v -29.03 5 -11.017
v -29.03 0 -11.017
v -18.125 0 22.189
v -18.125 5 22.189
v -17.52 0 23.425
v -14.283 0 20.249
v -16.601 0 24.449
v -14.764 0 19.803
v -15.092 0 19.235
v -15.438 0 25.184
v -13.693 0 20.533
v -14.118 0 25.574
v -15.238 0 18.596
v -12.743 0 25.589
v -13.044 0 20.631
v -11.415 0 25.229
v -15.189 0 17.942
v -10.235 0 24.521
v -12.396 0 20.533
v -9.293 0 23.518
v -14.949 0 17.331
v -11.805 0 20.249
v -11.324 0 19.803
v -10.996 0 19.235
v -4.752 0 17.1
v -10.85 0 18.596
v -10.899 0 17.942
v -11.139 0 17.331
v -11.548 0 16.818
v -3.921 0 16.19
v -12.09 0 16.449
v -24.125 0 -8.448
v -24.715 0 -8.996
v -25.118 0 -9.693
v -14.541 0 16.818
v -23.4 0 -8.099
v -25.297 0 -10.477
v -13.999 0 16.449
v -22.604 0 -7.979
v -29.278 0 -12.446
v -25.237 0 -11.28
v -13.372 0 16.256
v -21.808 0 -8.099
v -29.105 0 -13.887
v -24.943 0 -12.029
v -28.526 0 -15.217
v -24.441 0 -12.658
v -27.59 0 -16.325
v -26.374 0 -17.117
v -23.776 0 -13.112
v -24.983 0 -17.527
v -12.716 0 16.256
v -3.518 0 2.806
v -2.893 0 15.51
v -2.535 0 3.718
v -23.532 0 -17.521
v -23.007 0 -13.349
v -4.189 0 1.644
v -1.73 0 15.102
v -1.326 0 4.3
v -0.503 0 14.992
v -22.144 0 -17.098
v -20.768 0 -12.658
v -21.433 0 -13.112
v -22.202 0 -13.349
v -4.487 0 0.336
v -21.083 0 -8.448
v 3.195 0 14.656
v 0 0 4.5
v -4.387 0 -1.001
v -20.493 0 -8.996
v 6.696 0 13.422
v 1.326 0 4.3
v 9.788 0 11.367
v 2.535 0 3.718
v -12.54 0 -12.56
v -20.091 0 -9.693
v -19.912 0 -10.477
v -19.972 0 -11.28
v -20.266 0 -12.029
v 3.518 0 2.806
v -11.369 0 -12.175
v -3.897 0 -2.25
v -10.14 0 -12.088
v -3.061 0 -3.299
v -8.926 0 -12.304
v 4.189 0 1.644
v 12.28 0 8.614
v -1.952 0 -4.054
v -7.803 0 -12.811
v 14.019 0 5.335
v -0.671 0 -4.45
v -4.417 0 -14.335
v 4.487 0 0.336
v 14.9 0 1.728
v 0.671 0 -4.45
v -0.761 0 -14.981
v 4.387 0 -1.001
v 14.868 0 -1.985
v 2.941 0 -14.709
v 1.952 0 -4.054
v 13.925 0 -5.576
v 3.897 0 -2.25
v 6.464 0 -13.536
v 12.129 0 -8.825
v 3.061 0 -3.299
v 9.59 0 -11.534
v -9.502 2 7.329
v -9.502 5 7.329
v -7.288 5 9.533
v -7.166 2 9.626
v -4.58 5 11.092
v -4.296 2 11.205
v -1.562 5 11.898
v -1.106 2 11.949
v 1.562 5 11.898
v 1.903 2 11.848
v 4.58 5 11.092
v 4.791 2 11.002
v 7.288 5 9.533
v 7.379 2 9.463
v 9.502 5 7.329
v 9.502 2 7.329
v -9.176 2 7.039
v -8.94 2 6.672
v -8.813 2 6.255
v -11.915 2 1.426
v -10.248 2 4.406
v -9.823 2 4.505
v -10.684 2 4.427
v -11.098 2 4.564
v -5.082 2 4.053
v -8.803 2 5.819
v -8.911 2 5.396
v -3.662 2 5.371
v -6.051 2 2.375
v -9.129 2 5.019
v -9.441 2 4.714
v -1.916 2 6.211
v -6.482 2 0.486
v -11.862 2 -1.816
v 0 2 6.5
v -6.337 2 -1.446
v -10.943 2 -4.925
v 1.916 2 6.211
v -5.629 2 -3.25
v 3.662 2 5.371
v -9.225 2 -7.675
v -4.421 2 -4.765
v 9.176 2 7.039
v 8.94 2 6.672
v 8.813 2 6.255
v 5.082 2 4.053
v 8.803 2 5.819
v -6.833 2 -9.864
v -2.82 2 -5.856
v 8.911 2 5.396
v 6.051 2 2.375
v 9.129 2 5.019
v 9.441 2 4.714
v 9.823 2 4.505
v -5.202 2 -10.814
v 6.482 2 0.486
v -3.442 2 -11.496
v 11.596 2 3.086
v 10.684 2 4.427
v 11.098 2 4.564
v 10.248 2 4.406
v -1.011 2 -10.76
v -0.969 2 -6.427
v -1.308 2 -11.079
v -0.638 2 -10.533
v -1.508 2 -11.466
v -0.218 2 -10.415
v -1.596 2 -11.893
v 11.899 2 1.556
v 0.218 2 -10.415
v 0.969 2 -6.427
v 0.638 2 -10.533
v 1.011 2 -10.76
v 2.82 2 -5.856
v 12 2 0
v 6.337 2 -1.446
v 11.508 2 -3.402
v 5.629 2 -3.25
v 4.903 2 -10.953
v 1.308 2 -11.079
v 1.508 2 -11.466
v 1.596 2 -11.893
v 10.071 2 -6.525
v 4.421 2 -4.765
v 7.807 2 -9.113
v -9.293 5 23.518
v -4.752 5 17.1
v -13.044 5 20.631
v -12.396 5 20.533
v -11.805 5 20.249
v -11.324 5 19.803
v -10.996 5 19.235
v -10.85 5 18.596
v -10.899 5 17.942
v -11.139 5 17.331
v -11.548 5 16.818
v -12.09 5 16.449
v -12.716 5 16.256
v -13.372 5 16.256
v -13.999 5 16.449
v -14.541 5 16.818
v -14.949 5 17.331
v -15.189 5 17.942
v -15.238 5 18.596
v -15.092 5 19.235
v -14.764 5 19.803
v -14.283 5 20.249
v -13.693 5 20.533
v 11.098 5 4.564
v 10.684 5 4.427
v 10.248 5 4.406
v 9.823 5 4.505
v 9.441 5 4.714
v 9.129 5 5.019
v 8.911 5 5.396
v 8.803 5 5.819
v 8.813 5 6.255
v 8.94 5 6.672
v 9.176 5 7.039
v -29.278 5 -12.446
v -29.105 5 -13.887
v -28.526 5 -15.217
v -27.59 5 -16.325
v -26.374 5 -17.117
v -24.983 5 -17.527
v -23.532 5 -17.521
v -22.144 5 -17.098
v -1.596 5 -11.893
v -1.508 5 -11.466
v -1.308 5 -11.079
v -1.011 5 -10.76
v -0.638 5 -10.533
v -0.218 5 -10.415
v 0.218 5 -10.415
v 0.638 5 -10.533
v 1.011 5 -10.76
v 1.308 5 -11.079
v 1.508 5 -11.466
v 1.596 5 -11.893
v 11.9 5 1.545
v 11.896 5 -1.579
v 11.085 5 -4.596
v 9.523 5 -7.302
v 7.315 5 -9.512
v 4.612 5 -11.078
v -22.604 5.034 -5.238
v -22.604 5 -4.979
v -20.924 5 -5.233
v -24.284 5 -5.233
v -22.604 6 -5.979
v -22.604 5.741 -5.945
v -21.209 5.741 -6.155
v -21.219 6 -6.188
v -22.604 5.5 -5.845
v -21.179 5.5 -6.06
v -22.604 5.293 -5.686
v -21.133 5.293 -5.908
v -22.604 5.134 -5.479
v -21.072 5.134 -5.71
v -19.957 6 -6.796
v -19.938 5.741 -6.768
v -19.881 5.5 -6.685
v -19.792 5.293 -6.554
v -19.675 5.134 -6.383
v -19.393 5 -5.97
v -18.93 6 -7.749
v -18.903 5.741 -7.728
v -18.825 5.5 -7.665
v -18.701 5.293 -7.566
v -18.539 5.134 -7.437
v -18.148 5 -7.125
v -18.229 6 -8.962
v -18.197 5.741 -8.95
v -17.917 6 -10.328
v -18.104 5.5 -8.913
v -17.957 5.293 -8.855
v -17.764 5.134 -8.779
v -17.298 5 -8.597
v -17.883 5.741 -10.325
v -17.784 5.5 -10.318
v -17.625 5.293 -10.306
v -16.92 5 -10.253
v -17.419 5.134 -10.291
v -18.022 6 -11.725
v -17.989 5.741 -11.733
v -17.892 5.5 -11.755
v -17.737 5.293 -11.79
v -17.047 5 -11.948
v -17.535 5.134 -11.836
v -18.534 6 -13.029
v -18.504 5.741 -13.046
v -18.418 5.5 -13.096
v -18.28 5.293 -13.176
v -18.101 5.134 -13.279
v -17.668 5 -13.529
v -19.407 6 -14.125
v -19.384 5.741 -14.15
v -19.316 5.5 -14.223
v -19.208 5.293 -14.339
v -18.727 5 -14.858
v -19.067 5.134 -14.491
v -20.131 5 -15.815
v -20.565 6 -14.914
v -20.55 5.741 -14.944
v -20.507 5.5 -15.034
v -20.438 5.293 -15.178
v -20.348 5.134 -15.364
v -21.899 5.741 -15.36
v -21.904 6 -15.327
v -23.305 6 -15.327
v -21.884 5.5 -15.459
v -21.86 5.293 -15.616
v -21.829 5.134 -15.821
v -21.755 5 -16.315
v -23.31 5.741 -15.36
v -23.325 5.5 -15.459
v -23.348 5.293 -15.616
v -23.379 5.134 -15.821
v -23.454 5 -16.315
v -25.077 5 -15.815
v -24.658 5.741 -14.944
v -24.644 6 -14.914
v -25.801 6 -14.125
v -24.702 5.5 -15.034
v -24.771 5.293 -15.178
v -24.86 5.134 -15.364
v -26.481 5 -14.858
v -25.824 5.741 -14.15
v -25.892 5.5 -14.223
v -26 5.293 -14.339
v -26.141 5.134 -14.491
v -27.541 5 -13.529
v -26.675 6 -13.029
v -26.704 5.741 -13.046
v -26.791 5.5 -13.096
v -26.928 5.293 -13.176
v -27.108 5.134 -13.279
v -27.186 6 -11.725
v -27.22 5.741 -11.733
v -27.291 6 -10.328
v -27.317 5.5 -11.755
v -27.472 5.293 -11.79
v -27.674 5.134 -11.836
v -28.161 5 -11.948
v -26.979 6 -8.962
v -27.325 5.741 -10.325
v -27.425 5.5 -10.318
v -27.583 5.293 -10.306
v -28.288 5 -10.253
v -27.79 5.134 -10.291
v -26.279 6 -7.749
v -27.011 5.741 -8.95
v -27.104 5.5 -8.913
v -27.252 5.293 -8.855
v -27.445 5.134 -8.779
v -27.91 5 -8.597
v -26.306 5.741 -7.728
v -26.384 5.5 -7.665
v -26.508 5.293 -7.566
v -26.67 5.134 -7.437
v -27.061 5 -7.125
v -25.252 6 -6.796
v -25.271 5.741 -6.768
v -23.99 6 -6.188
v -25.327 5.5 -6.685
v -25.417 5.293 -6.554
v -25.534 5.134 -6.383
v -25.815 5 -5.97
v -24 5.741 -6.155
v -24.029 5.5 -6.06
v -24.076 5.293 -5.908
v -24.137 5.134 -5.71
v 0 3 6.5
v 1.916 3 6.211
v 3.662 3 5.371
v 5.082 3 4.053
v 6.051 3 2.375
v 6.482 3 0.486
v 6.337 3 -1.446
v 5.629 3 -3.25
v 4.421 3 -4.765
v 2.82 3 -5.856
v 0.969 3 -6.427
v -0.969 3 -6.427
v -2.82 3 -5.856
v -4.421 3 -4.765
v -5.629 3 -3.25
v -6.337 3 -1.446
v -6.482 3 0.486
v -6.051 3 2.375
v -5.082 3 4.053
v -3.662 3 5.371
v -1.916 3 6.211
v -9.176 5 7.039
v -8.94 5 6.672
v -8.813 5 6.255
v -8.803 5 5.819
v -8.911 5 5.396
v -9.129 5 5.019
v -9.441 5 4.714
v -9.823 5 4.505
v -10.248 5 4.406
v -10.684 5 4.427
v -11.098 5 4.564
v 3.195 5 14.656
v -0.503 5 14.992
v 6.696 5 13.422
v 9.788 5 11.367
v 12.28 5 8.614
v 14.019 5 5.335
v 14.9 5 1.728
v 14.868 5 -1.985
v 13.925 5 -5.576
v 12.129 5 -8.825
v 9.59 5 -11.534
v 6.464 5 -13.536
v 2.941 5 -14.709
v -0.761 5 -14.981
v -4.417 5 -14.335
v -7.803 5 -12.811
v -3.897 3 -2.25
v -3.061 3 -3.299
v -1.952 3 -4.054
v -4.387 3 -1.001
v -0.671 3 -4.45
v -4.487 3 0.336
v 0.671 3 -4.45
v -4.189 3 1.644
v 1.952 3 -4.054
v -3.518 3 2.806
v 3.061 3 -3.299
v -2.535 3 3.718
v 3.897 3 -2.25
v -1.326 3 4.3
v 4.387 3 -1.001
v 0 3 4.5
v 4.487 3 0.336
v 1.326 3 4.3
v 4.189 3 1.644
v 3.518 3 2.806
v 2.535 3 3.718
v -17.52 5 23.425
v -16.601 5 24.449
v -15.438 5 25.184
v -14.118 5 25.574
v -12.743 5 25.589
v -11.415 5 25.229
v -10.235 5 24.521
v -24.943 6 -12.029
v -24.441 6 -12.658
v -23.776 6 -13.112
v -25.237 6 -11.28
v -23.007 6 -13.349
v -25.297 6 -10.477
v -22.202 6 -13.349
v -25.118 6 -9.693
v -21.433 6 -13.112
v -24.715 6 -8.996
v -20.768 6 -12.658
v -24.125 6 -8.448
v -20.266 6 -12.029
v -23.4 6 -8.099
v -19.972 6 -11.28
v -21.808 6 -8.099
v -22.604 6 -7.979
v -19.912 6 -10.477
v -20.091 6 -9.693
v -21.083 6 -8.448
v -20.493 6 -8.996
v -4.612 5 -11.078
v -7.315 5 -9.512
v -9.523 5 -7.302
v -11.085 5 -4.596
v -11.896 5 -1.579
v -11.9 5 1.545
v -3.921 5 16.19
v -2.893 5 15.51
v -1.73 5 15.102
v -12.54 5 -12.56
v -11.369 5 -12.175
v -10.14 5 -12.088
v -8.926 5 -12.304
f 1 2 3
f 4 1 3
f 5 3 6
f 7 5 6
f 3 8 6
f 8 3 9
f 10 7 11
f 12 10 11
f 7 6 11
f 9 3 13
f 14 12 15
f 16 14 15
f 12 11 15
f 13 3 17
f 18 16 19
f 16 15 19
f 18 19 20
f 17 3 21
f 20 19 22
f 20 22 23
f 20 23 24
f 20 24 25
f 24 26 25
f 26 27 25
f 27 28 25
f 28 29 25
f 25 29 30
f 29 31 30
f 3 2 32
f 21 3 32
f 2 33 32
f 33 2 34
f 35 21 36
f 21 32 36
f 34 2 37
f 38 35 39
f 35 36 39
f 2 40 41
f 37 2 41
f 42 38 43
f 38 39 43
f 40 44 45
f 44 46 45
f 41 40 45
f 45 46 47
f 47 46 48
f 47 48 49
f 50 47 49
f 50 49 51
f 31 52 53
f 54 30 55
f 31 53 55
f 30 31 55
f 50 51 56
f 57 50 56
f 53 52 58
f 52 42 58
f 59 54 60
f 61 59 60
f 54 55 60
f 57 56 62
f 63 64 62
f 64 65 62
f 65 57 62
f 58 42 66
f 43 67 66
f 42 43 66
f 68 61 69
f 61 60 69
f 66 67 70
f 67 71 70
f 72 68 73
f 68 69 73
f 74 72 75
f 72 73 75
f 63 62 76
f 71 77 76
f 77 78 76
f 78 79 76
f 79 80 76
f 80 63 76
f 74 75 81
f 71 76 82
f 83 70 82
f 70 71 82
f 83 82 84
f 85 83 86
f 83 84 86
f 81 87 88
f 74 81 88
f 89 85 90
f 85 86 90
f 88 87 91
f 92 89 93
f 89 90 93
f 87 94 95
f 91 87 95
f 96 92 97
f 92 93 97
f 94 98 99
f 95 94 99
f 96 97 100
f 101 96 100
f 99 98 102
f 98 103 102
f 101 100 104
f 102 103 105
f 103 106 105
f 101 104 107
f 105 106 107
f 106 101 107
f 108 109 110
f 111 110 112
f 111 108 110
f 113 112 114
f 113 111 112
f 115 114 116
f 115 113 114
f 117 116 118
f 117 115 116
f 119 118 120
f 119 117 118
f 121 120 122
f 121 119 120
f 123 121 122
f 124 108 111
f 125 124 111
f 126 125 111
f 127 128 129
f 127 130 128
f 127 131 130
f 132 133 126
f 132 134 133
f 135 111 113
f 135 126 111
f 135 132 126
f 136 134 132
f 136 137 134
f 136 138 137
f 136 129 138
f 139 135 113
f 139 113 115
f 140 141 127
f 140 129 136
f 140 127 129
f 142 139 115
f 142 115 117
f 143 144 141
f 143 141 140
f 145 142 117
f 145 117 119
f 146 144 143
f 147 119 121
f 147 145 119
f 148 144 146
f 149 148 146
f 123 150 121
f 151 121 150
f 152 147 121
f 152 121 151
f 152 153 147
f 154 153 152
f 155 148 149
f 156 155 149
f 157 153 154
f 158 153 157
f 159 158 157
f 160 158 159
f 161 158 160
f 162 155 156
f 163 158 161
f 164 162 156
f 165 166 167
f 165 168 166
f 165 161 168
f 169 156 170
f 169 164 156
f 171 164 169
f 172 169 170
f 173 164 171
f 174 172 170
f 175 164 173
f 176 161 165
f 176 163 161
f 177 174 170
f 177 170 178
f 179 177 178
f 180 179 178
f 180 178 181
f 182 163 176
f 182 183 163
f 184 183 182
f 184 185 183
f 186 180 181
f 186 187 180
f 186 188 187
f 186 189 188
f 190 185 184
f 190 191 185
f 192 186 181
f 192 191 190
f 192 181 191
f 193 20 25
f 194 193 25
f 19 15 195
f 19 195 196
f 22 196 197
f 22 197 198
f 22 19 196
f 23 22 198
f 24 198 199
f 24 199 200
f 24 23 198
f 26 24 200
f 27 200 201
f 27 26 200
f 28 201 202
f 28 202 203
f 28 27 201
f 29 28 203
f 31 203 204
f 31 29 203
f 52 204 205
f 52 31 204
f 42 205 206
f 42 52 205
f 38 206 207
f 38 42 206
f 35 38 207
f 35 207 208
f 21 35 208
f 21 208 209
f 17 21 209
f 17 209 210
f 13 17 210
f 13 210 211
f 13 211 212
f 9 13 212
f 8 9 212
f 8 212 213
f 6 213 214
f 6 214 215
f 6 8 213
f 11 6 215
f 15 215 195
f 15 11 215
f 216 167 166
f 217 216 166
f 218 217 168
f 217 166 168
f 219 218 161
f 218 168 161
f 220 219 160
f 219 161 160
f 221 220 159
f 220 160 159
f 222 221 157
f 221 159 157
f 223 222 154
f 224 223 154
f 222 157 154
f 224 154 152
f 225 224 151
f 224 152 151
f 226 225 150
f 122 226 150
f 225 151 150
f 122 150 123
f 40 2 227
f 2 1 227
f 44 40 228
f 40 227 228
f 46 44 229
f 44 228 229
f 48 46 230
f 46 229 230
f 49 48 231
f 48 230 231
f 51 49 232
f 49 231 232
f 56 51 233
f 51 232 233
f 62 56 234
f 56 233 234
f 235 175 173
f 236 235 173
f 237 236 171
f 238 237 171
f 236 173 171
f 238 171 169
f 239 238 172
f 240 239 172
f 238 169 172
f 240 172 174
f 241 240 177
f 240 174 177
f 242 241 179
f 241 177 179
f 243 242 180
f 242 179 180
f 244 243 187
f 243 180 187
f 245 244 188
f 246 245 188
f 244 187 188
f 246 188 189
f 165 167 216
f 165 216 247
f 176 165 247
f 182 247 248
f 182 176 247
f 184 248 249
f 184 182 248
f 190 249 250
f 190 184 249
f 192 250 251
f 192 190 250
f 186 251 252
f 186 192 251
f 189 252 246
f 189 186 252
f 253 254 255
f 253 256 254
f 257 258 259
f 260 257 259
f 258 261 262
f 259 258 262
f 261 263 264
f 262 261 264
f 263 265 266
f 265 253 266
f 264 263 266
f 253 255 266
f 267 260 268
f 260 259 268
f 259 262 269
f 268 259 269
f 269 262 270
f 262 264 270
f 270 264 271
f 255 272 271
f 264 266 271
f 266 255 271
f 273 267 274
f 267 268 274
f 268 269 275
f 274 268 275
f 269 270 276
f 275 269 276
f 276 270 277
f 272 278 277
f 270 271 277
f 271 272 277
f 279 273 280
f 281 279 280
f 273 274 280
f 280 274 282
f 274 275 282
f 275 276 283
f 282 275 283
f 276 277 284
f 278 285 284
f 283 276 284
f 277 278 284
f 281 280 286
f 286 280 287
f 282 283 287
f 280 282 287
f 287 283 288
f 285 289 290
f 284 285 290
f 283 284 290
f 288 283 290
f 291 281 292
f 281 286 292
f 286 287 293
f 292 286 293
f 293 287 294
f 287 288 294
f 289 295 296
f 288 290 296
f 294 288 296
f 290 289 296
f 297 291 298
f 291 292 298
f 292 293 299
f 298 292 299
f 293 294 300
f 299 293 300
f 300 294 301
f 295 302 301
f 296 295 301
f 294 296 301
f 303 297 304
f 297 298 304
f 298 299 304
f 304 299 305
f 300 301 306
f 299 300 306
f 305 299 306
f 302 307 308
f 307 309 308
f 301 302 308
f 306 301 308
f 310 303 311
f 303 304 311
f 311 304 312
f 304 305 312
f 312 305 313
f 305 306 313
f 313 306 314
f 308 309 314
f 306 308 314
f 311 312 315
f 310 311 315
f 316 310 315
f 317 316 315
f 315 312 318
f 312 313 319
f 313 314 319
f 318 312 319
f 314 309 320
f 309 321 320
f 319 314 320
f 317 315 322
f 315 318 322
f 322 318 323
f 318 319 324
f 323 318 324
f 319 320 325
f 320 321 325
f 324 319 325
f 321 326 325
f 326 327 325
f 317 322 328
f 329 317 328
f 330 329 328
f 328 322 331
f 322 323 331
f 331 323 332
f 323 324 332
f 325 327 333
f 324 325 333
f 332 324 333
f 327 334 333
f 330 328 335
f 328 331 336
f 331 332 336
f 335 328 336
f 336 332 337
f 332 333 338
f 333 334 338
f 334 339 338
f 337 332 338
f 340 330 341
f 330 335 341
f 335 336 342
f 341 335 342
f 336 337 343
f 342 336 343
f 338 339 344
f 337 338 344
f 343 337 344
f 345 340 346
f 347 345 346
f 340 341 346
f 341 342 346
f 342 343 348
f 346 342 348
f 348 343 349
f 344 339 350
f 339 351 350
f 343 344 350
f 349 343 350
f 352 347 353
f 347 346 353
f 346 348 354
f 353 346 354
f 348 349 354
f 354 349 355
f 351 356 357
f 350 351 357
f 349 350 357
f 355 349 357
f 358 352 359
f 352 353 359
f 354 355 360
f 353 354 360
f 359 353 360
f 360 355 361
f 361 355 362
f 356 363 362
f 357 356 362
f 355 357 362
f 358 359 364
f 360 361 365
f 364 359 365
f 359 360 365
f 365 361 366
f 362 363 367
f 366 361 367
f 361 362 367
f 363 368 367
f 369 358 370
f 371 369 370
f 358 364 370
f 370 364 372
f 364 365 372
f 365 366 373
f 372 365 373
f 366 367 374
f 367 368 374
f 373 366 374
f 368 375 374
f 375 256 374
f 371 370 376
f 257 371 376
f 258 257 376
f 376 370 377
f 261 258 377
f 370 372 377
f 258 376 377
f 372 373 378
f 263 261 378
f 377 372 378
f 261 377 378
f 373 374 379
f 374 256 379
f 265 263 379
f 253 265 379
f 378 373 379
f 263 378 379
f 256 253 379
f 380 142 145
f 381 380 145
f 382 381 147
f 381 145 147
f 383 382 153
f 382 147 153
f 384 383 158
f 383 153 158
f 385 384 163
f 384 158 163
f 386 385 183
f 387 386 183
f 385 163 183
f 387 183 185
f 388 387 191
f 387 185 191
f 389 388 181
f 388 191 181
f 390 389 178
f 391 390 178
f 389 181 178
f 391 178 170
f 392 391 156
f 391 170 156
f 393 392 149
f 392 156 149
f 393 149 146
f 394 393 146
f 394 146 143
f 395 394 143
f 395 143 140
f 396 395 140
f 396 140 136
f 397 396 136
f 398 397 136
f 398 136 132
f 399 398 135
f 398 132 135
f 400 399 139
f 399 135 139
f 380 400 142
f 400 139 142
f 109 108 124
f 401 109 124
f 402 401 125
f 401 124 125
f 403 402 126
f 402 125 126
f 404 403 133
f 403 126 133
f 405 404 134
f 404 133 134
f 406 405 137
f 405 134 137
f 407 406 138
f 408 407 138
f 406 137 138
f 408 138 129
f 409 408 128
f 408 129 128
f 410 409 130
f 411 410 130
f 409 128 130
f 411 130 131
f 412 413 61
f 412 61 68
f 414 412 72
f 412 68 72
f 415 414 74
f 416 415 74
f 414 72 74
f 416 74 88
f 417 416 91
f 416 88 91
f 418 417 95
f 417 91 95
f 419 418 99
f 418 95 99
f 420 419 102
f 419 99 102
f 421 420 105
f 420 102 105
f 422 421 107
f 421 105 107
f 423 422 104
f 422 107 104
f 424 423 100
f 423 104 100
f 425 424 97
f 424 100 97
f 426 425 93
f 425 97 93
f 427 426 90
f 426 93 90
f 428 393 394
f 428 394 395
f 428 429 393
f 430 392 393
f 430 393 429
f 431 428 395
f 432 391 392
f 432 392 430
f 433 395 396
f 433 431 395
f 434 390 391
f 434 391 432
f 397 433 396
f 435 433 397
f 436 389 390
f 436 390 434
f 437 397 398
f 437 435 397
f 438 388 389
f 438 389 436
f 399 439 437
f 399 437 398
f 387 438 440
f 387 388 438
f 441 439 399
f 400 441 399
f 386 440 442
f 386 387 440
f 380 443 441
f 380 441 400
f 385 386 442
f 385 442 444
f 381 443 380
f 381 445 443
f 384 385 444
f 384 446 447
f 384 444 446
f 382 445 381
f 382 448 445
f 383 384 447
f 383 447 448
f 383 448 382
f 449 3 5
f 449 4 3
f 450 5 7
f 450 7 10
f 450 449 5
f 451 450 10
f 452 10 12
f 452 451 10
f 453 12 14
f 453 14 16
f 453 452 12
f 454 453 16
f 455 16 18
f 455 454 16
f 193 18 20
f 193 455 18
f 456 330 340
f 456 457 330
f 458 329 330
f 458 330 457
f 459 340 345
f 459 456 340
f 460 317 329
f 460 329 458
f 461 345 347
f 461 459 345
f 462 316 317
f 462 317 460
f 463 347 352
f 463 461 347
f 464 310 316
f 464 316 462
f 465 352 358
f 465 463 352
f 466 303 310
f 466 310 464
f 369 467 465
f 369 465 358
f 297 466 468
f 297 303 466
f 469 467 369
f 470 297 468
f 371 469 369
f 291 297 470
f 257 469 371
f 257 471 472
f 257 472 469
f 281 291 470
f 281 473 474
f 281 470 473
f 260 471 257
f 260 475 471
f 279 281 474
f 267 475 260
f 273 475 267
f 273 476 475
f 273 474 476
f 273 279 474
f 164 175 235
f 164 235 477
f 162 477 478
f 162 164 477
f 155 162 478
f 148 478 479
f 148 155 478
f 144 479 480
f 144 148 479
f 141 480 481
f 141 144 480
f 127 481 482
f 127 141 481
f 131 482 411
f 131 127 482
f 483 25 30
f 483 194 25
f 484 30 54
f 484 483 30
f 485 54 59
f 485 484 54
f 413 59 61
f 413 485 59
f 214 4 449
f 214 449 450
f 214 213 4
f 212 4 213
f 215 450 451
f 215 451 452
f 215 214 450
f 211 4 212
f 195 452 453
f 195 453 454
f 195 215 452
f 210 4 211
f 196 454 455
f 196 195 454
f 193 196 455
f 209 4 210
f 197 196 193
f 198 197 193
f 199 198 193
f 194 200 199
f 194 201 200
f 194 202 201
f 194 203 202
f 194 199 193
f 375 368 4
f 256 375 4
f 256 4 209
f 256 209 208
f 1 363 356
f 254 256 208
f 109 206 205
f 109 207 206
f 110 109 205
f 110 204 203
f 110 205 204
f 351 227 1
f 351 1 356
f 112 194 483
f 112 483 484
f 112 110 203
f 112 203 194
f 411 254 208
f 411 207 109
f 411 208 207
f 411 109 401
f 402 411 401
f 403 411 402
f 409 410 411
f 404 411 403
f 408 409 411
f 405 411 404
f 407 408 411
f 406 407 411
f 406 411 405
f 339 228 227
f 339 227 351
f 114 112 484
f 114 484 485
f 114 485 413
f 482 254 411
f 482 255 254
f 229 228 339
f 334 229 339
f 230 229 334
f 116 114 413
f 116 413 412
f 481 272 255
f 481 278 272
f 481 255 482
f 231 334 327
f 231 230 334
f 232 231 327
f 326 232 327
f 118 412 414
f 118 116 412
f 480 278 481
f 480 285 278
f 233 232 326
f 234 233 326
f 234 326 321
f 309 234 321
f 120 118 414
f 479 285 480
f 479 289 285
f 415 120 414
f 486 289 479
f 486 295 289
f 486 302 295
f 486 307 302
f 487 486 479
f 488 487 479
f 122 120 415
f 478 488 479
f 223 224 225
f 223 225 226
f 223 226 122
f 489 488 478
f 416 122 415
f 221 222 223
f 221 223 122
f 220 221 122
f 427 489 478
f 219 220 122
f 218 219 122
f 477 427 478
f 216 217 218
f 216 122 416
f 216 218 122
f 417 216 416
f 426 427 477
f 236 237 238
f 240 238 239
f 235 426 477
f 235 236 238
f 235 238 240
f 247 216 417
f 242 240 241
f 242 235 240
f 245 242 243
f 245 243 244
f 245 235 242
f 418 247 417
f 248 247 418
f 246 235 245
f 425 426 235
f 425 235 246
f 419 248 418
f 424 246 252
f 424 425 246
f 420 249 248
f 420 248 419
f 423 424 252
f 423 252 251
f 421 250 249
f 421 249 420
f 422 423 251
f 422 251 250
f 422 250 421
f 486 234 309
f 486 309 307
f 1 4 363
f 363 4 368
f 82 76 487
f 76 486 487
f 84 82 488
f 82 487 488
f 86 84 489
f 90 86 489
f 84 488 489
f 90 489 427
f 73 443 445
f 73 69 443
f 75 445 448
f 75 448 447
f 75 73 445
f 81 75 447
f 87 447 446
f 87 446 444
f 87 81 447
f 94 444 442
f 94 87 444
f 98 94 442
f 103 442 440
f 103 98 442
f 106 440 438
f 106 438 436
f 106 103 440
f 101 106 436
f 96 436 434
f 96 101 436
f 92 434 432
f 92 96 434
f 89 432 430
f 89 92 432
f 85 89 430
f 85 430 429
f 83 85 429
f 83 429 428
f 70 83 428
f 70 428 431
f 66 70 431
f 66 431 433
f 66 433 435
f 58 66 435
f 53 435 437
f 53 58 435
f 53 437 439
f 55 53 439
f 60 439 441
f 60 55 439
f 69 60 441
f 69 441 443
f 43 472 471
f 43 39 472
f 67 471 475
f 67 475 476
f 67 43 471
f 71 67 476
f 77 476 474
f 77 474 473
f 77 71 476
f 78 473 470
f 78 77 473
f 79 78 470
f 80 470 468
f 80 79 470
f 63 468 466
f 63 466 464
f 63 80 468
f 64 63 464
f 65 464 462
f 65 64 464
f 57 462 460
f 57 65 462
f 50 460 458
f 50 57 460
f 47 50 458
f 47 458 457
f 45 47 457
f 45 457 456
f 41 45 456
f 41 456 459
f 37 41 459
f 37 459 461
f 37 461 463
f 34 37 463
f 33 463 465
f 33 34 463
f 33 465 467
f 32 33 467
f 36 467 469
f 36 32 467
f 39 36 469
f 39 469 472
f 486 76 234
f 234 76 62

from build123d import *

# Parameters (mm, degrees)
SKETCH2_R           = 12
SKETCH2_R_2         = 2.2
SKETCH2_R_3         = 2.7
BOSS_EXTRUDE1_DEPTH = 5
SKETCH2_4_R         = 4.5
BOSS_EXTRUDE2_DEPTH = 2
FILLET1_R           = 5
FILLET2_R           = 5
SKETCH3_R           = 4.7
SKETCH3_R_2         = 2.7
BOSS_EXTRUDE3_DEPTH = 1
FILLET4_R           = 1
SKETCH4_R           = 6.5
SKETCH4_R_2         = 4.5
BOSS_EXTRUDE5_DEPTH = 1
BOSS_EXTRUDE6_DEPTH = 3


with BuildPart() as part:
    # Sketch2 → Boss-Extrude1 (new body)
    with BuildSketch(Plane(origin=(0, 0, 0), x_dir=(1, 0, 0), z_dir=(0, 1, 0))):
        with BuildLine():
            Line((-32.658907628, 22.065310299), (-15.027926619, -31.62041432))
            Line((-15.027926619, -31.62041432), (-3.044319626, -14.687822099))
            ThreePointArc((-3.044319626, -14.687822099), (14.508216797, 3.809415358), (-9.86730521, 11.297623108))
            Line((-9.86730521, 11.297623108), (-32.658907628, 22.065310299))
        make_face()
        with Locations(Location((0, 0, 0), (0, 0, 270))):
            Circle(SKETCH2_R, mode=Mode.SUBTRACT)
        with Locations(Location((-13.044155697, -18.431125905, 0), (0, 0, 270))):
            Circle(SKETCH2_R_2, mode=Mode.SUBTRACT)
        with Locations(Location((-22.604306415, 10.679200882, 0), (0, 0, 270))):
            Circle(SKETCH2_R_3, mode=Mode.SUBTRACT)
    extrude(amount=BOSS_EXTRUDE1_DEPTH)

    # Sketch2<4> → Boss-Extrude2 (add)
    # profile 1 of 2: a face of its own
    with BuildSketch(Plane(origin=(0, 0, 0), x_dir=(1, 0, 0), z_dir=(0, 1, 0))):
        with BuildLine():
            Line((9.028311423, 2.370559296), (-1.105938309, -11.948928841))
            ThreePointArc((-1.105938309, -11.948928841), (8.084823445, -8.867673306), (12, 0))
            ThreePointArc((12, 0), (5.567714695, 10.630171827), (-6.833425512, 9.864293983))
            Line((-6.833425512, 9.864293983), (9.028311423, 2.370559296))
        make_face()
    # profile 2 of 2: a face of its own
    with BuildSketch(Plane(origin=(0, 0, 0), x_dir=(1, 0, 0), z_dir=(0, 1, 0))):
        with BuildLine():
            ThreePointArc((-6.833425512, 9.864293983), (-11.606573438, -3.047532287), (-1.105938309, -11.948928841))
            Line((-1.105938309, -11.948928841), (9.028311423, 2.370559296))
            Line((9.028311423, 2.370559296), (-6.833425512, 9.864293983))
        make_face()
        with Locations(Location((0, 0, 0), (0, 0, 270))):
            Circle(SKETCH2_4_R, mode=Mode.SUBTRACT)
    extrude(amount=BOSS_EXTRUDE2_DEPTH)

    # Fillet1
    fillet1_edges = [part.edges().sort_by_distance(p)[0] for p in [
        (-15.027926619, 2.5, 31.62041432),
        (-32.658907628, 2.5, -22.065310299),
    ]]
    fillet(fillet1_edges, radius=FILLET1_R)

    # Fillet2
    fillet2_edges = [part.edges().sort_by_distance(p)[0] for p in [
        (-9.86730521, 2.5, -11.297623108),
        (-3.044319626, 2.5, 14.687822099),
    ]]
    fillet(fillet2_edges, radius=FILLET2_R)

    # Sketch3 → Boss-Extrude3 (add)
    with BuildSketch(Plane(origin=(0, 5, 0), x_dir=(1, 0, 0), z_dir=(0, 1, 0))):
        with Locations(Location((-22.604306415, 10.679200882, 0), (0, 0, 270))):
            Circle(SKETCH3_R)
        with Locations(Location((-22.604306415, 10.679200882, 0), (0, 0, 270))):
            Circle(SKETCH3_R_2, mode=Mode.SUBTRACT)
    extrude(amount=BOSS_EXTRUDE3_DEPTH)

    # Fillet4
    fillet4_edges = [part.edges().sort_by_distance(p)[0] for p in [
        (-22.604306415, 5, -15.379200882),
    ]]
    fillet(fillet4_edges, radius=FILLET4_R - 0.0001)  # a hair under: the kernel refuses the full size

    # Sketch4 → Boss-Extrude5 (add)
    with BuildSketch(Plane(origin=(0, 2, 0), x_dir=(1, 0, 0), z_dir=(0, 1, 0))):
        with Locations(Location((0, 0, 0), (0, 0, 270))):
            Circle(SKETCH4_R)
        with Locations(Location((0, 0, 0), (0, 0, 270))):
            Circle(SKETCH4_R_2, mode=Mode.SUBTRACT)
    extrude(amount=BOSS_EXTRUDE5_DEPTH)

    # Sketch4<4> → Boss-Extrude6 (add)
    with BuildSketch(Plane(origin=(0, 2, 0), x_dir=(1, 0, 0), z_dir=(0, 1, 0))):
        with BuildLine():
            ThreePointArc((1.596440485, 11.893333333), (0, 12), (-1.596440485, 11.893333333))
            ThreePointArc((-1.596440485, 11.893333333), (0, 10.4), (1.596440485, 11.893333333))
        make_face()
        with BuildLine():
            ThreePointArc((9.50170856, -7.329224682), (10.392304845, -6), (11.098149045, -4.564108651))
            ThreePointArc((11.098149045, -4.564108651), (9.006664199, -5.2), (9.50170856, -7.329224682))
        make_face()
        with BuildLine():
            ThreePointArc((-9.50170856, -7.329224682), (-9.006664199, -5.2), (-11.098149045, -4.564108651))
            ThreePointArc((-11.098149045, -4.564108651), (-10.392304845, -6), (-9.50170856, -7.329224682))
        make_face()
    extrude(amount=BOSS_EXTRUDE6_DEPTH)


solid = part.part
